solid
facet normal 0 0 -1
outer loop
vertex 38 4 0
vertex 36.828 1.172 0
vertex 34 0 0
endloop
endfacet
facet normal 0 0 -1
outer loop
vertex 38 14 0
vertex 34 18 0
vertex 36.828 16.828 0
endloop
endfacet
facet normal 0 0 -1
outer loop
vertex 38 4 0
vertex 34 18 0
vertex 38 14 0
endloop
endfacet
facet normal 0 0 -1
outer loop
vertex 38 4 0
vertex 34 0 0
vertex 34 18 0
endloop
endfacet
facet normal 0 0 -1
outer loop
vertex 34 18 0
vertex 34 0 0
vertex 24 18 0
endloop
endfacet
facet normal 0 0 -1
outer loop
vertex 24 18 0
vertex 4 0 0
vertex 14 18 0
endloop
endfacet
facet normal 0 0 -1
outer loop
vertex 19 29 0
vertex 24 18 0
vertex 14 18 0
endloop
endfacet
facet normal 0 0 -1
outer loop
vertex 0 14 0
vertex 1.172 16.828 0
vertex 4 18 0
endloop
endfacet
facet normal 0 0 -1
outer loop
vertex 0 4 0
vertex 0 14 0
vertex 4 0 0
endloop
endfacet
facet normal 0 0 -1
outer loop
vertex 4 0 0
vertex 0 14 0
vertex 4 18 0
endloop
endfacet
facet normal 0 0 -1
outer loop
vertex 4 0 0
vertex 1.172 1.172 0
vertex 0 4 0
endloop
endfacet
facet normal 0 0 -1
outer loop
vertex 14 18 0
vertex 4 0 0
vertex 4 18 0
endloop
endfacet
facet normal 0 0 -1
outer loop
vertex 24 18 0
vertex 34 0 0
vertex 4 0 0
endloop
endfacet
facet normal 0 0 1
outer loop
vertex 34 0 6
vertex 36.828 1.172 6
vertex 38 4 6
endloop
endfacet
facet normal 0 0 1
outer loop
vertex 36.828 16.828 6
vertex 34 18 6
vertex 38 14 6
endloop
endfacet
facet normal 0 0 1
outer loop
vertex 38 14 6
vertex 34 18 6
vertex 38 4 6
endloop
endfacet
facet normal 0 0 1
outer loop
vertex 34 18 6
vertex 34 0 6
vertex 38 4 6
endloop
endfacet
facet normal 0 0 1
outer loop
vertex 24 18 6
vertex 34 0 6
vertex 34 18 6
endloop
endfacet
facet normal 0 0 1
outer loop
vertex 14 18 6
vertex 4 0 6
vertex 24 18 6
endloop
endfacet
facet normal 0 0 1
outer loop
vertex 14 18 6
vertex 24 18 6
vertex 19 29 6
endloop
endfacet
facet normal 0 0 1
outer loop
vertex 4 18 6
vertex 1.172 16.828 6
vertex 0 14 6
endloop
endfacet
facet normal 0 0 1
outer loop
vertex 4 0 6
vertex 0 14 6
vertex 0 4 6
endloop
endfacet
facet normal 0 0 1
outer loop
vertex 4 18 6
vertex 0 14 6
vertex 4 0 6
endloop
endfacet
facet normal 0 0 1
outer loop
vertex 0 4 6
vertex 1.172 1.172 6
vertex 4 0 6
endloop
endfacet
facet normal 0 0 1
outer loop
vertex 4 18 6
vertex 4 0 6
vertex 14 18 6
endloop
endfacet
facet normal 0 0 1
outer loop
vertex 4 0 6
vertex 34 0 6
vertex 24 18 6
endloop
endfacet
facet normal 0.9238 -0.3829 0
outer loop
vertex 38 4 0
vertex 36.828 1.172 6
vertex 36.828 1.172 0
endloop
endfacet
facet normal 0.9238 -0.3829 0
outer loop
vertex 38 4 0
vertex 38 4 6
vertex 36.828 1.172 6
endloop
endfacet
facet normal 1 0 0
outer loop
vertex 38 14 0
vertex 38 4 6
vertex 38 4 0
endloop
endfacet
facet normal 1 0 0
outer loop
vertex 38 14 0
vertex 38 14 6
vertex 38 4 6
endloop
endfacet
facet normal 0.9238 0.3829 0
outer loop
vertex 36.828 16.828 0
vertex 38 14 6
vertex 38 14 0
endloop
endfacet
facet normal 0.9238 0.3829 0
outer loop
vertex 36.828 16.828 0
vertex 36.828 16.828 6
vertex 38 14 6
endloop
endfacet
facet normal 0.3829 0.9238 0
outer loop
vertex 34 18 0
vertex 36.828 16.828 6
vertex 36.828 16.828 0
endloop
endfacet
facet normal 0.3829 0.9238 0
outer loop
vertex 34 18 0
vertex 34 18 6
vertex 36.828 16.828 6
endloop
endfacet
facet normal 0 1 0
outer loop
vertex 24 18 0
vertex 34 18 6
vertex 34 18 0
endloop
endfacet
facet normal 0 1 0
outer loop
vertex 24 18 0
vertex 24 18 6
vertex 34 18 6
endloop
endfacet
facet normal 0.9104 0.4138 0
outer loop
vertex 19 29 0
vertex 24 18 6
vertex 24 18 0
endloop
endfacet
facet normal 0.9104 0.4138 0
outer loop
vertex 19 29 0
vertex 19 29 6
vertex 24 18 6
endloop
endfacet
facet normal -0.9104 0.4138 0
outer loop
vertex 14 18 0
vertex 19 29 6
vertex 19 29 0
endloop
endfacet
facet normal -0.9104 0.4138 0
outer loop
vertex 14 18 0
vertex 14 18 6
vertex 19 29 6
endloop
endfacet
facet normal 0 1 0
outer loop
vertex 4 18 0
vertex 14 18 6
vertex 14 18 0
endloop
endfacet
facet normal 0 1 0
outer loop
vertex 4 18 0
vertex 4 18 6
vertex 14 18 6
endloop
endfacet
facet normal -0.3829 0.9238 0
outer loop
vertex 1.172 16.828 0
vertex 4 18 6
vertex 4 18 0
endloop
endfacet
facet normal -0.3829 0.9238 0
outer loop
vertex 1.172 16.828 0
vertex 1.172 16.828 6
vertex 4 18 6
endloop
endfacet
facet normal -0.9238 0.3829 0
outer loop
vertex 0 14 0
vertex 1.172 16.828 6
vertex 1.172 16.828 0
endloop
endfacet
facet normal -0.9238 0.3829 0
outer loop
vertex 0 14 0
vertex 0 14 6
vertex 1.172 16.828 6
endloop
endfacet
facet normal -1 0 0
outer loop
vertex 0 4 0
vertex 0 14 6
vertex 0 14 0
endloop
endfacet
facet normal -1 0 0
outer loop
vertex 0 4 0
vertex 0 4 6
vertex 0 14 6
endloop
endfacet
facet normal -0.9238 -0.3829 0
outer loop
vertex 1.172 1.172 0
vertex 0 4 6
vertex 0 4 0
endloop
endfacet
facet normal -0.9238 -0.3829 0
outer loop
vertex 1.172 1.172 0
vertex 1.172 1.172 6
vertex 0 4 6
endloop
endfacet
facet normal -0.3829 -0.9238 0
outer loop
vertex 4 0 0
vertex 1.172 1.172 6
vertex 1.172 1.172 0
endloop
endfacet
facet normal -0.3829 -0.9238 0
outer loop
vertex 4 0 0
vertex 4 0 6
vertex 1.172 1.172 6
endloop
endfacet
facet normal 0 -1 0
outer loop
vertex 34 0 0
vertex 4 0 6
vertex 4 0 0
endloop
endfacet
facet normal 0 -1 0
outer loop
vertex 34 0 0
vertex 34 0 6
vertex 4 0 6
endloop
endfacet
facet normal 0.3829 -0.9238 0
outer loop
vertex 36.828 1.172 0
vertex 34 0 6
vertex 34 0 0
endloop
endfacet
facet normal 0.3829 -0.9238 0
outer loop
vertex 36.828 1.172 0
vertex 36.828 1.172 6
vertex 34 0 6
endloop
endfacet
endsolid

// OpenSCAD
$fn = 32;

// ----------------------------------------------------------------------
// Ratchet pawl: 38 x 18 mm body, beak 11 mm сверху
// ----------------------------------------------------------------------

// --- parameters (mm) ---
profile_height = 6;       // extrusion height
profile_points = 15;      // points of the closed outline

profile = [[0, 4], [1.172, 1.172], [4, 0], [34, 0], [36.828, 1.172], [38, 4], [38, 14], [36.828, 16.828], [34, 18], [24, 18], [19, 29], [14, 18], [4, 18], [1.172, 16.828], [0, 14]];  // single closed polygon, 15 points, counter clockwise

// --- the one profile operation ---
linear_extrude(height = profile_height) polygon(points = profile);
